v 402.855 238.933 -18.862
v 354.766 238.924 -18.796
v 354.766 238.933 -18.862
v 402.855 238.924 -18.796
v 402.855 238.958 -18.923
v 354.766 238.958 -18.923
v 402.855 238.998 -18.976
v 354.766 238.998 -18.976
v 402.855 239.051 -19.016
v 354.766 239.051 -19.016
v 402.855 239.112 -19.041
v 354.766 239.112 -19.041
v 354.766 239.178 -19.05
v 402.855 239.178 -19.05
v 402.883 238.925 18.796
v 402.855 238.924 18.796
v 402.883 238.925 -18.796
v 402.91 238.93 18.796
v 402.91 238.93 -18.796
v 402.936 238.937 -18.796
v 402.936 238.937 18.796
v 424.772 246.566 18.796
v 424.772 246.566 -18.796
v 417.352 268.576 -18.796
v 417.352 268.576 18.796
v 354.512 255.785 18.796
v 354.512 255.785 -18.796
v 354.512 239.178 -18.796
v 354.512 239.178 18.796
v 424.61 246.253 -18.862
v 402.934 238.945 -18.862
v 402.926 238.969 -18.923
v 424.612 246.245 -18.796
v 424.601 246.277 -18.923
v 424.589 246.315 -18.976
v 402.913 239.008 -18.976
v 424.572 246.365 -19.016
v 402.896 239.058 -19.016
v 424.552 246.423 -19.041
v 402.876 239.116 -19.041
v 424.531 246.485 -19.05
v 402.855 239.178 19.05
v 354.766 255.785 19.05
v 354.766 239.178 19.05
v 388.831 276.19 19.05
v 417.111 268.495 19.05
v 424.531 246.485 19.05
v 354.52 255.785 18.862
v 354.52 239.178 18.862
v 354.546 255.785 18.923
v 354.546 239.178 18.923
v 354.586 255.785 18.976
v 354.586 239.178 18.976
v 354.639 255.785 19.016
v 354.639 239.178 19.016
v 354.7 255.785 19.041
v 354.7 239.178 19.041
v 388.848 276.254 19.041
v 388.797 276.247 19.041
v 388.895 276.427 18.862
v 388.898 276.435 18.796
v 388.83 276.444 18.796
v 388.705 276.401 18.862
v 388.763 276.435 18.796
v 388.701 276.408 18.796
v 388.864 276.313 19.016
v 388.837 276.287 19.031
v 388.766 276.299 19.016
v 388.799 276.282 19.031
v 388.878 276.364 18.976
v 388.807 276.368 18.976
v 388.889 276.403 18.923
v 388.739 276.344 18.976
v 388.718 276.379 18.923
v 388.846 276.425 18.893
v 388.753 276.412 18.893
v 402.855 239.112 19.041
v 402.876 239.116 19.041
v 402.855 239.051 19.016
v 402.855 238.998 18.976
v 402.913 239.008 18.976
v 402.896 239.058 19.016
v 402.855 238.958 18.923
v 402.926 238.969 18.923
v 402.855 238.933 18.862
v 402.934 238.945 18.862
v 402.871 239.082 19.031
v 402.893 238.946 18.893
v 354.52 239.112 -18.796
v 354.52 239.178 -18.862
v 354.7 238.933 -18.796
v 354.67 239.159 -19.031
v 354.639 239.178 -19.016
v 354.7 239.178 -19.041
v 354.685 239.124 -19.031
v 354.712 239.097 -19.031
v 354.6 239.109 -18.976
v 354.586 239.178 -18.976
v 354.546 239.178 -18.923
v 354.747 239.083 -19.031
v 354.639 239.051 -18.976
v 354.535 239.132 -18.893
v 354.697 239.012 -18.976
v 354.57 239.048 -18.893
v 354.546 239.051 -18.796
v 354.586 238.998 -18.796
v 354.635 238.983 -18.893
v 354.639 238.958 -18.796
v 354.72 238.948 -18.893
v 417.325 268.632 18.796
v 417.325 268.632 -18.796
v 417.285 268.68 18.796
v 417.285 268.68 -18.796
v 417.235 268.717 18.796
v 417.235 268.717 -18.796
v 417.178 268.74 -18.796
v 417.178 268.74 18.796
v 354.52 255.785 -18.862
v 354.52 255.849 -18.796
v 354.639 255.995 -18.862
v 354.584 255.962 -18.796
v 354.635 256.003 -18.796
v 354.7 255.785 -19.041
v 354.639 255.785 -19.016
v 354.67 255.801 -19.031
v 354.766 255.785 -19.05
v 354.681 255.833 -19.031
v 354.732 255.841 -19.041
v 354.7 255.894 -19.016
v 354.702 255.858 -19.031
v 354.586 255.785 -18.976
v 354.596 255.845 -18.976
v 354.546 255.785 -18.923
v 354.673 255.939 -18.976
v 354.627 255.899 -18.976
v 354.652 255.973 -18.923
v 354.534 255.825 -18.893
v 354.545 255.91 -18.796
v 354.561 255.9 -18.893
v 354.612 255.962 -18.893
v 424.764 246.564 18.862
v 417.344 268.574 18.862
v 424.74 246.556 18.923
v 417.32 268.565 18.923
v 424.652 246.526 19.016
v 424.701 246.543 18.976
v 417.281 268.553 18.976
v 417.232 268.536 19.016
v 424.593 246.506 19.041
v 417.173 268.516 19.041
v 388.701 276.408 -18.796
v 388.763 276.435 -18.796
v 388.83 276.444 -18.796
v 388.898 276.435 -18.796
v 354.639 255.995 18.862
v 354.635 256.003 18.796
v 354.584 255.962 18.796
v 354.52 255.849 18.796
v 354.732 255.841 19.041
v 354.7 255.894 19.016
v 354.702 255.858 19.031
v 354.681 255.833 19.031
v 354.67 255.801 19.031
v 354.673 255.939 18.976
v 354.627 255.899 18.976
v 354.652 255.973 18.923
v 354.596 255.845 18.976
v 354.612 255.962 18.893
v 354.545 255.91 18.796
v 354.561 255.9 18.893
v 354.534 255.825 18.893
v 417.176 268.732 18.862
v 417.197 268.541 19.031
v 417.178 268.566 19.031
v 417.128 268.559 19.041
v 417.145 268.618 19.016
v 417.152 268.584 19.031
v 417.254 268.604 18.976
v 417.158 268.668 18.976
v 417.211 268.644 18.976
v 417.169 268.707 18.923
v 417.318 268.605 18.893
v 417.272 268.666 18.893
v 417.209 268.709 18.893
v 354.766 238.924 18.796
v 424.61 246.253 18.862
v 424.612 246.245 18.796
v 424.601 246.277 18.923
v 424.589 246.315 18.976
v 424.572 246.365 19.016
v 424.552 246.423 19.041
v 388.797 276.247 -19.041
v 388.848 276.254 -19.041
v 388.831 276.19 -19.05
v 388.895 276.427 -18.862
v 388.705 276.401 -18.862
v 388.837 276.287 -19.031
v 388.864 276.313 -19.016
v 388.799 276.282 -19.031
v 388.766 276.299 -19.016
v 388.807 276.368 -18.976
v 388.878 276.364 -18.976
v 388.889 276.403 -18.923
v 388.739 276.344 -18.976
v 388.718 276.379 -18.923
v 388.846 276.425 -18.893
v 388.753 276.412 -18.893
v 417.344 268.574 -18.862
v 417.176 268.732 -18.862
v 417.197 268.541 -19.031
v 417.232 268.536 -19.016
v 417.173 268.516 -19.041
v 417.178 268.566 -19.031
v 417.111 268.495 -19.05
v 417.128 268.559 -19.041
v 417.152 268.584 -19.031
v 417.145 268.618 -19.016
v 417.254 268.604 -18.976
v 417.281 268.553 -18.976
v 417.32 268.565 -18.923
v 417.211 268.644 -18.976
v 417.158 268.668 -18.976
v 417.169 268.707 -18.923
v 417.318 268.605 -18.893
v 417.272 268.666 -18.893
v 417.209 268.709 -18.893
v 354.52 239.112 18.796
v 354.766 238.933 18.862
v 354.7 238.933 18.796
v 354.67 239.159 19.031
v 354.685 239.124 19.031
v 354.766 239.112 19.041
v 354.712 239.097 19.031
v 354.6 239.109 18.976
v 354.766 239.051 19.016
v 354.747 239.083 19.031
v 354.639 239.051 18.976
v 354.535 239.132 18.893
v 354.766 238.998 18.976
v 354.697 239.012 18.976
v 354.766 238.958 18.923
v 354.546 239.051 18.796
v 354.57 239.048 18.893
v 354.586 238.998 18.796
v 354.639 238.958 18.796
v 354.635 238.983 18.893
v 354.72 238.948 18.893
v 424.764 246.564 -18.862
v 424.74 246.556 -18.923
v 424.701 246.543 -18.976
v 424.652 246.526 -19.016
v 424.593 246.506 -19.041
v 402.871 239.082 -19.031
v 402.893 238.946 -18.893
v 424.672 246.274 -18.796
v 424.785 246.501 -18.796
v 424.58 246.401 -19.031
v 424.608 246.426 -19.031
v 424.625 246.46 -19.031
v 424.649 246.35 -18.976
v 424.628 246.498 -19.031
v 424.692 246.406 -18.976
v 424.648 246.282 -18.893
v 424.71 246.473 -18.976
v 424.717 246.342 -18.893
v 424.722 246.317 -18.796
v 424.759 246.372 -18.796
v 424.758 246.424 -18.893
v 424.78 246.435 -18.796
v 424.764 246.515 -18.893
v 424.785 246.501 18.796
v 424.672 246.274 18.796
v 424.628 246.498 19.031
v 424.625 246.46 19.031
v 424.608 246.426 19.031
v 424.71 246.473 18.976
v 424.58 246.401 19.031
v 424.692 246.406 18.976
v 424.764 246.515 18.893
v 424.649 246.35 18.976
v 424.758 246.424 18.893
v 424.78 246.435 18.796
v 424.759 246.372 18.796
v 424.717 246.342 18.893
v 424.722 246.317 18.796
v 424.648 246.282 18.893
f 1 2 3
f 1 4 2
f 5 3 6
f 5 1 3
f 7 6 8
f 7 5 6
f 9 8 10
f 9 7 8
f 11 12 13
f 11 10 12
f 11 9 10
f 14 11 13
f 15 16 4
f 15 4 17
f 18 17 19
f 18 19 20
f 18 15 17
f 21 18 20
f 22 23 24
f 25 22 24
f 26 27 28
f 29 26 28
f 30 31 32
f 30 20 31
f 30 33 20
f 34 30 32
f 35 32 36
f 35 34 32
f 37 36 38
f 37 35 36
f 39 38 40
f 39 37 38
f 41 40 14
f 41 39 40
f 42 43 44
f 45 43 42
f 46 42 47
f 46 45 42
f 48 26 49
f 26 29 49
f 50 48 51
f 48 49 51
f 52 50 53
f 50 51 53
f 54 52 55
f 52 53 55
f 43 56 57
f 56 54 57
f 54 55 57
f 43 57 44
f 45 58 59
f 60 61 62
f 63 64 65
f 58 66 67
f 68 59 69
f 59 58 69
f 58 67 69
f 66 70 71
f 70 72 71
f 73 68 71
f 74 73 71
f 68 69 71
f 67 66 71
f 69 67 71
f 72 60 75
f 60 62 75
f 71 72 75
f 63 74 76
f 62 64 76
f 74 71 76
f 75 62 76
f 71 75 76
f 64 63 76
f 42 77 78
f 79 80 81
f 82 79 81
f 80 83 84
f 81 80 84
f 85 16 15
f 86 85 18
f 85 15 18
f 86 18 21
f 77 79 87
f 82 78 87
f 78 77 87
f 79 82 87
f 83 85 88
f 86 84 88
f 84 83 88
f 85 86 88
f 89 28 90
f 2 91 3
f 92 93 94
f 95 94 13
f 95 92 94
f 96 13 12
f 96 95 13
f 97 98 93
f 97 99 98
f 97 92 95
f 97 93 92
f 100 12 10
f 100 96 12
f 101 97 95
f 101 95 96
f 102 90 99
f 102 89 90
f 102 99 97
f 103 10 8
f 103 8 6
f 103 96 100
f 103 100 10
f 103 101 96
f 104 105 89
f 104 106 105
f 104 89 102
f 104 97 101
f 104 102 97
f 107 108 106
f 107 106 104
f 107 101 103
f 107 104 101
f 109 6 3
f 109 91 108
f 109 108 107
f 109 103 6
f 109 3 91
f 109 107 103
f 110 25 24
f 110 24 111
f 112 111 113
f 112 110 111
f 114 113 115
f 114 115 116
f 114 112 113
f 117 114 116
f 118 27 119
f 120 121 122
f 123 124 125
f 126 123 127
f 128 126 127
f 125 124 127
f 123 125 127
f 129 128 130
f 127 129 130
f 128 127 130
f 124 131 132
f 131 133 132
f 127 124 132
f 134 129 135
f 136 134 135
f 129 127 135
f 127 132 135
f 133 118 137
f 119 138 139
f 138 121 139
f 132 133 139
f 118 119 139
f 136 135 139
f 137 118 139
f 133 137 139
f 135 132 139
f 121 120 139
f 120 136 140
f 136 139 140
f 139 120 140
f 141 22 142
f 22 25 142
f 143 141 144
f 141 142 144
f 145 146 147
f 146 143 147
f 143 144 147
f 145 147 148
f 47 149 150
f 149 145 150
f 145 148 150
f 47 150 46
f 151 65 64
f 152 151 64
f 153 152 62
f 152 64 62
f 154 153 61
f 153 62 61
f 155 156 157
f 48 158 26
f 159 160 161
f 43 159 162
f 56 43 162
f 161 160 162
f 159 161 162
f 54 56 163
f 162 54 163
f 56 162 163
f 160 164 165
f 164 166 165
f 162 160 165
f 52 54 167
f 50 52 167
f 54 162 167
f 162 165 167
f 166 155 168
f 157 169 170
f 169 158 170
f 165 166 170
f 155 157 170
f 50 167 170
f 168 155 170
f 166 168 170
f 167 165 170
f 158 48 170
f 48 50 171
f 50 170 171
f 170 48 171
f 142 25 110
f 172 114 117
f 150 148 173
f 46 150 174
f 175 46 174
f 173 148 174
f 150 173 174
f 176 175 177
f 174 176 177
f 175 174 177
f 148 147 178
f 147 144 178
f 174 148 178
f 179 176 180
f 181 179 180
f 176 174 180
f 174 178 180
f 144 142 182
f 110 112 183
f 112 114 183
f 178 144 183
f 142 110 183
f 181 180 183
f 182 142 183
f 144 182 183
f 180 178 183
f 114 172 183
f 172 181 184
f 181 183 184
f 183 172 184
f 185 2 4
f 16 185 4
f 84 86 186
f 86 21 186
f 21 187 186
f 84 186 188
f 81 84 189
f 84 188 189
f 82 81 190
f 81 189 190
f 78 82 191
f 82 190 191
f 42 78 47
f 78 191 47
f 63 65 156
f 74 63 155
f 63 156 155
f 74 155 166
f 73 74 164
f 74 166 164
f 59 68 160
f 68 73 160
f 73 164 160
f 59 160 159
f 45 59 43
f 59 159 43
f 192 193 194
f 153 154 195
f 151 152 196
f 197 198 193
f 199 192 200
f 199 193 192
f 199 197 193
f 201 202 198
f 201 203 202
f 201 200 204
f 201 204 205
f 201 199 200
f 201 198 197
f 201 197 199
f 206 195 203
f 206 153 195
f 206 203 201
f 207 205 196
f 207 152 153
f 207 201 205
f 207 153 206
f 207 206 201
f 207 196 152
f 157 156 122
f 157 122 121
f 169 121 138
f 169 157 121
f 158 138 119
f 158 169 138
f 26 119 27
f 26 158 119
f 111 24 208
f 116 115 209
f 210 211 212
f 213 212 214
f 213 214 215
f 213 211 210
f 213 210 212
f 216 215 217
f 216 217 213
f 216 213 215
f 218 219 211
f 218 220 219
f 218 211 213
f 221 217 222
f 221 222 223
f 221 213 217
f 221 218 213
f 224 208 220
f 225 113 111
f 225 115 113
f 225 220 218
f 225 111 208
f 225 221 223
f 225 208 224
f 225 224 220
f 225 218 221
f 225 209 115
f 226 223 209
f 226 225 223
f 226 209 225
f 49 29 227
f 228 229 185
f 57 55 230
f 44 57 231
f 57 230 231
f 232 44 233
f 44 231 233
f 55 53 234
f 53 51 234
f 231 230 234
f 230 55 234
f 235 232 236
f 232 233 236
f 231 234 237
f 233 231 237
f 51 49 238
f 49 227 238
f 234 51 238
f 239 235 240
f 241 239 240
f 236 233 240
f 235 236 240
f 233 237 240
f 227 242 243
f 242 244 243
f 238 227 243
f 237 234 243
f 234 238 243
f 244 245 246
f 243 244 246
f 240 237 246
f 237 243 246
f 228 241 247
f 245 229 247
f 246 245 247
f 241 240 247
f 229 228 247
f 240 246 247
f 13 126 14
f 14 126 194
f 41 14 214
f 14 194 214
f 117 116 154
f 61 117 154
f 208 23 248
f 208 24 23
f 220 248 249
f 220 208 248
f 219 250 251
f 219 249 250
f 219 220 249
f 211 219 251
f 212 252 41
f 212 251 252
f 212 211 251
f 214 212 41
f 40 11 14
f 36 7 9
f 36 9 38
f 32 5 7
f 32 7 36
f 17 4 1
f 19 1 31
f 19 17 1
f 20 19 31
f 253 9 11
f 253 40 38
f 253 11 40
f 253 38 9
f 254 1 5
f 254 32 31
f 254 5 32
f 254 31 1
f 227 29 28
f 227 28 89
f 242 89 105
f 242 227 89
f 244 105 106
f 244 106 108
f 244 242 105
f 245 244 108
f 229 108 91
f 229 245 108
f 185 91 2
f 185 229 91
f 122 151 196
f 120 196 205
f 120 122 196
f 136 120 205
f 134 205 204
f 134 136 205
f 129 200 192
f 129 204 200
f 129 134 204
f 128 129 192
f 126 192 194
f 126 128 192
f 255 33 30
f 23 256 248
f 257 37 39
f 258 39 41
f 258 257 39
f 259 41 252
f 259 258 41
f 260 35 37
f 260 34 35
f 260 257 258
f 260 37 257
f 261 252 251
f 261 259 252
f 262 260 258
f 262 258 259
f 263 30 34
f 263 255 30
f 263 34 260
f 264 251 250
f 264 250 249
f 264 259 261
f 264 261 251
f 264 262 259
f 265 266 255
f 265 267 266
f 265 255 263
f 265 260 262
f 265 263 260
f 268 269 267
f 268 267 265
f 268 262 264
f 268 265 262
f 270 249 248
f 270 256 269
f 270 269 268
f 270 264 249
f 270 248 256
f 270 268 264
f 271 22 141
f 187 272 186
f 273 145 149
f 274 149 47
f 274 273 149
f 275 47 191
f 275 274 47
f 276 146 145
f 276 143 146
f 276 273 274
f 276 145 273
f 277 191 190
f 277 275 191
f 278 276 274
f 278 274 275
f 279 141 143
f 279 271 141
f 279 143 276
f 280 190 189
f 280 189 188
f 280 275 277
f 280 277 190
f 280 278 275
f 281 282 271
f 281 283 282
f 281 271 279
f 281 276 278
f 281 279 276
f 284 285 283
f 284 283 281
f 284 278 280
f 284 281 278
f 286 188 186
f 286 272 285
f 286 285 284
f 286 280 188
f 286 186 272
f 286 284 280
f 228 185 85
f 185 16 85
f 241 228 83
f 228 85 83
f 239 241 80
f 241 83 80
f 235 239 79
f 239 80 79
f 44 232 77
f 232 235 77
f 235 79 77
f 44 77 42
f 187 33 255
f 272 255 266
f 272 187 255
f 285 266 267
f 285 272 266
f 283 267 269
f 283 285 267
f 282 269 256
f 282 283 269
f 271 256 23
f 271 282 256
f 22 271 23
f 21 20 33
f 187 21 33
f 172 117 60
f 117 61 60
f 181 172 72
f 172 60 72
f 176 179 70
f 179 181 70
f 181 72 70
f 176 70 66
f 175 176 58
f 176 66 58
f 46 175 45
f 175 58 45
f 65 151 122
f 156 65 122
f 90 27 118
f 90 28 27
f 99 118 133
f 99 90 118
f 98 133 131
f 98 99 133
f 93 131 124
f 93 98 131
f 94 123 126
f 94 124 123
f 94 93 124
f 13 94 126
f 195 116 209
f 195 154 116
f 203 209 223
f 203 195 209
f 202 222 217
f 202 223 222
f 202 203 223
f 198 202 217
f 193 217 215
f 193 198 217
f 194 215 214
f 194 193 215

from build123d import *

# Parameters (mm, degrees)
BOSS_EXTRUDE1_DEPTH      = 19.05
BOSS_EXTRUDE1_DEPTH_BACK = 19.05
FILLET1_R                = 0.254


with BuildPart() as part:
    # Sketch1 → Boss-Extrude1 (new, two sides: drawn at the far end of the back side and taken through both)
    with BuildSketch(Plane.XY.offset(-BOSS_EXTRUDE1_DEPTH_BACK)):
        Polygon((388.793340161, 276.463831059), (354.511506684, 255.928673382), (354.511506684, 238.923904635), (402.896942526, 238.923904635), (424.852995025, 246.325755667), (417.308575132, 268.704709057), align=None)
    extrude(amount=BOSS_EXTRUDE1_DEPTH + BOSS_EXTRUDE1_DEPTH_BACK)

    # Fillet1
    fillet1_edges = [part.edges().sort_by_distance(p)[0] for p in [
        (371.652423423, 266.19625222, -19.05),
        (424.852995025, 246.325755667, 0),
        (402.896942526, 238.923904635, 0),
        (354.511506684, 238.923904635, 0),
        (354.511506684, 255.928673382, 0),
        (388.793340161, 276.463831059, 0),
        (417.308575132, 268.704709057, 0),
        (354.511506684, 247.426289008, -19.05),
        (378.704224605, 238.923904635, -19.05),
        (421.080785078, 257.515232362, 19.05),
        (403.050957647, 272.584270058, 19.05),
        (371.652423423, 266.19625222, 19.05),
        (354.511506684, 247.426289008, 19.05),
        (378.704224605, 238.923904635, 19.05),
        (413.874968775, 242.624830151, -19.05),
        (413.874968775, 242.624830151, 19.05),
        (421.080785078, 257.515232362, -19.05),
        (403.050957647, 272.584270058, -19.05),
    ]]
    fillet(fillet1_edges, radius=FILLET1_R)


solid = part.part
